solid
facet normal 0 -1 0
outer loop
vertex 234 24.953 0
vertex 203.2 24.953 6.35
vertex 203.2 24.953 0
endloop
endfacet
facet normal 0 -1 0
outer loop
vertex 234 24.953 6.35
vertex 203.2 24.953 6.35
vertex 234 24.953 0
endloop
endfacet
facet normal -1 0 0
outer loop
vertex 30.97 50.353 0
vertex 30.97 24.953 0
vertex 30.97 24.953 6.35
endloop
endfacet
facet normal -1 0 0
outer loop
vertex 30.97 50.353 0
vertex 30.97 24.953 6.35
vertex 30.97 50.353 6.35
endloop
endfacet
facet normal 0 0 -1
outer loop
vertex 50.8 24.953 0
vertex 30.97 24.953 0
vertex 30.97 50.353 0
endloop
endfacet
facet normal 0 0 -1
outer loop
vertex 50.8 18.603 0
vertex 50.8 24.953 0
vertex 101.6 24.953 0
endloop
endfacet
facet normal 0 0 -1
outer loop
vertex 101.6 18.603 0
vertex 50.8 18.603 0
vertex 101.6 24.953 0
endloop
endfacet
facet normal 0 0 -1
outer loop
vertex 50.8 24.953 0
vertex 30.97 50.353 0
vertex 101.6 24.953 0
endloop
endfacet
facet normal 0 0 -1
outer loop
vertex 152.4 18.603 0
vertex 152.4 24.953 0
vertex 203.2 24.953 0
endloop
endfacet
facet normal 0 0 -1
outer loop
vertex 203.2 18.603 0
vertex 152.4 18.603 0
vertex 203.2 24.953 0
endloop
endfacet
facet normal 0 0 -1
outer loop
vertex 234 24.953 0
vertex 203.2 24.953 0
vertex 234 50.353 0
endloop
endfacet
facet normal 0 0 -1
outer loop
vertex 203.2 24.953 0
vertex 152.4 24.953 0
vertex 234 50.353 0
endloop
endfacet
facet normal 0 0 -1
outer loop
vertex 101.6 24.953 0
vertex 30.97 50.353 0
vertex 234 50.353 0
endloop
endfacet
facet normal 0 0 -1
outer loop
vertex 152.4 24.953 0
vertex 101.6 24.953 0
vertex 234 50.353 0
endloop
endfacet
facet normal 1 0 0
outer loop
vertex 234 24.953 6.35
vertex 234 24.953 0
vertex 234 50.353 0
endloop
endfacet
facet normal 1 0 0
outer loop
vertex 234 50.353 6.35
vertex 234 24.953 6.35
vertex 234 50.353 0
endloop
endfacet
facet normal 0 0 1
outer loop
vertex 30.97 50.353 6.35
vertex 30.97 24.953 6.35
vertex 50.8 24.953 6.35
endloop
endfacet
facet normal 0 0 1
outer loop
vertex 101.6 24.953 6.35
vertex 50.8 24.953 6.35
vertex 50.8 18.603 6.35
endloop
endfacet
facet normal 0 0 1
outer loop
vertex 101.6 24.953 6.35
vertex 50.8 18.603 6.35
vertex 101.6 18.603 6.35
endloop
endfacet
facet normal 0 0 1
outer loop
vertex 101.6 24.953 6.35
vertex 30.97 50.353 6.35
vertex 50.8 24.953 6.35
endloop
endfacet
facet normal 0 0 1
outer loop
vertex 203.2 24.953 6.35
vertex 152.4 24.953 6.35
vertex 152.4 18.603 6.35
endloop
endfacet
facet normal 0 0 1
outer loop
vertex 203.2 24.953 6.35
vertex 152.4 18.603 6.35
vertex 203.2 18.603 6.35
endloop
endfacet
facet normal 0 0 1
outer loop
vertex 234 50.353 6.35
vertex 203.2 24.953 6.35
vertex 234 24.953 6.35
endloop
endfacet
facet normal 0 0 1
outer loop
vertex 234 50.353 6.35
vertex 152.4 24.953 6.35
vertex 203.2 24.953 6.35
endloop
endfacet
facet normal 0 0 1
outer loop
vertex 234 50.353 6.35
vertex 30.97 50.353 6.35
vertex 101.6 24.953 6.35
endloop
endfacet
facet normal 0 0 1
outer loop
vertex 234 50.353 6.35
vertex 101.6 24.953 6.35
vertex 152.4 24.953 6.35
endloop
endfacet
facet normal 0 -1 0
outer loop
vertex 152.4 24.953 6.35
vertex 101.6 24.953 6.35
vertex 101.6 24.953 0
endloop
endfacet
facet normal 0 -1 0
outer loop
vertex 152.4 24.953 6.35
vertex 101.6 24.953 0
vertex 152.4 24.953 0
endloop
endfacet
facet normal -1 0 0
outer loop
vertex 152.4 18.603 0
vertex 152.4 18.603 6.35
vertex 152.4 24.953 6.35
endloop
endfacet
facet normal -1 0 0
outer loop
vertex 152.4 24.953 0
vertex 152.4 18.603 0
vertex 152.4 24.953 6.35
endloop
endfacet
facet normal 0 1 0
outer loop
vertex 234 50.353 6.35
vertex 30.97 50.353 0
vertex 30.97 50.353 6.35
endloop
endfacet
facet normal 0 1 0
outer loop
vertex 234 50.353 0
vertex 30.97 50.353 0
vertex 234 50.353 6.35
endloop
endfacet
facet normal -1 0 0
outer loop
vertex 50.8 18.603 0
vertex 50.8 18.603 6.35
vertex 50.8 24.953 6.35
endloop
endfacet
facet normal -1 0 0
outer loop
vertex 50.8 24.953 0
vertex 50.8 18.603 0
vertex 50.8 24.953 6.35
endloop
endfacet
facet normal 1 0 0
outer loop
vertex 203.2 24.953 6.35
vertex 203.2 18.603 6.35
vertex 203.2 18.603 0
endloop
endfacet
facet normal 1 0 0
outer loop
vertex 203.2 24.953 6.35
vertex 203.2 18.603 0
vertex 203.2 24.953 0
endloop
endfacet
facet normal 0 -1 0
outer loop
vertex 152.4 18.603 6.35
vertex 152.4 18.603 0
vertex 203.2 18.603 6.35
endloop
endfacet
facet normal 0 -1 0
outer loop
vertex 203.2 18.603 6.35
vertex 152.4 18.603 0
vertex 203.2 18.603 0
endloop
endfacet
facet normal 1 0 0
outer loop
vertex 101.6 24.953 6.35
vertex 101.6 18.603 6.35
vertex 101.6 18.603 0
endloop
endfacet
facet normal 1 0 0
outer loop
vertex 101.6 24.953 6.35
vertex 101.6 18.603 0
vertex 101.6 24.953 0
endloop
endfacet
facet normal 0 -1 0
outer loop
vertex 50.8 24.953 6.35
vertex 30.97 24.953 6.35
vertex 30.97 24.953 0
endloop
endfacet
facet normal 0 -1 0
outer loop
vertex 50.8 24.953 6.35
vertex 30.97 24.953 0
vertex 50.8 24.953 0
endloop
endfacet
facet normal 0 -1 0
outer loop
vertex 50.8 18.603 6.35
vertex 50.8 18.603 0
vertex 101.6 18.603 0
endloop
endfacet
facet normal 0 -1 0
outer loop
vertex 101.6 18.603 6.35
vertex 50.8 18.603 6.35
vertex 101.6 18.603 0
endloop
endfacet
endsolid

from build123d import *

# Parameters (mm, degrees)
SKETCH1_W           = 203.029806175
SKETCH1_H           = 31.75
BOSS_EXTRUDE1_DEPTH = 6.35
CUT_EXTRUDE1_REACH  = 241.441
SKETCH2_W           = 19.829806175
SKETCH2_H           = 6.35
SKETCH2_W_2         = 50.8
SKETCH2_W_3         = 30.8


with BuildPart() as part:
    # Sketch1 → Boss-Extrude1 (new body)
    with BuildSketch(Plane.XY):
        with Locations((132.485096913, 34.478439237)):
            Rectangle(SKETCH1_W, SKETCH1_H)
    extrude(amount=BOSS_EXTRUDE1_DEPTH)

    # Sketch2 → Cut-Extrude1 (cut, up to next)
    with BuildSketch(Plane.XY.offset(6.35), mode=Mode.PRIVATE) as cut_extrude1_sk1:
        with Locations((40.885096913, 21.778439237)):
            Rectangle(SKETCH2_W, SKETCH2_H)
    cut_extrude1_tool1 = extrude(cut_extrude1_sk1.sketch, amount=-CUT_EXTRUDE1_REACH, mode=Mode.PRIVATE) & part.part
    # Sketch2 → Cut-Extrude1 (cut, up to next)
    with BuildSketch(Plane.XY.offset(6.35), mode=Mode.PRIVATE) as cut_extrude1_sk2:
        with Locations((127, 21.778439237)):
            Rectangle(SKETCH2_W_2, SKETCH2_H)
    cut_extrude1_tool2 = extrude(cut_extrude1_sk2.sketch, amount=-CUT_EXTRUDE1_REACH, mode=Mode.PRIVATE) & part.part
    # Sketch2 → Cut-Extrude1 (cut, up to next)
    with BuildSketch(Plane.XY.offset(6.35), mode=Mode.PRIVATE) as cut_extrude1_sk3:
        with Locations((218.6, 21.778439237)):
            Rectangle(SKETCH2_W_3, SKETCH2_H)
    cut_extrude1_tool3 = extrude(cut_extrude1_sk3.sketch, amount=-CUT_EXTRUDE1_REACH, mode=Mode.PRIVATE) & part.part
    add(cut_extrude1_tool1.solids().sort_by_distance((40.885097, 21.778439, 6.35))[0], mode=Mode.SUBTRACT)
    add(cut_extrude1_tool2.solids().sort_by_distance((127, 21.778439, 6.35))[0], mode=Mode.SUBTRACT)
    add(cut_extrude1_tool3.solids().sort_by_distance((218.6, 21.778439, 6.35))[0], mode=Mode.SUBTRACT)


solid = part.part
